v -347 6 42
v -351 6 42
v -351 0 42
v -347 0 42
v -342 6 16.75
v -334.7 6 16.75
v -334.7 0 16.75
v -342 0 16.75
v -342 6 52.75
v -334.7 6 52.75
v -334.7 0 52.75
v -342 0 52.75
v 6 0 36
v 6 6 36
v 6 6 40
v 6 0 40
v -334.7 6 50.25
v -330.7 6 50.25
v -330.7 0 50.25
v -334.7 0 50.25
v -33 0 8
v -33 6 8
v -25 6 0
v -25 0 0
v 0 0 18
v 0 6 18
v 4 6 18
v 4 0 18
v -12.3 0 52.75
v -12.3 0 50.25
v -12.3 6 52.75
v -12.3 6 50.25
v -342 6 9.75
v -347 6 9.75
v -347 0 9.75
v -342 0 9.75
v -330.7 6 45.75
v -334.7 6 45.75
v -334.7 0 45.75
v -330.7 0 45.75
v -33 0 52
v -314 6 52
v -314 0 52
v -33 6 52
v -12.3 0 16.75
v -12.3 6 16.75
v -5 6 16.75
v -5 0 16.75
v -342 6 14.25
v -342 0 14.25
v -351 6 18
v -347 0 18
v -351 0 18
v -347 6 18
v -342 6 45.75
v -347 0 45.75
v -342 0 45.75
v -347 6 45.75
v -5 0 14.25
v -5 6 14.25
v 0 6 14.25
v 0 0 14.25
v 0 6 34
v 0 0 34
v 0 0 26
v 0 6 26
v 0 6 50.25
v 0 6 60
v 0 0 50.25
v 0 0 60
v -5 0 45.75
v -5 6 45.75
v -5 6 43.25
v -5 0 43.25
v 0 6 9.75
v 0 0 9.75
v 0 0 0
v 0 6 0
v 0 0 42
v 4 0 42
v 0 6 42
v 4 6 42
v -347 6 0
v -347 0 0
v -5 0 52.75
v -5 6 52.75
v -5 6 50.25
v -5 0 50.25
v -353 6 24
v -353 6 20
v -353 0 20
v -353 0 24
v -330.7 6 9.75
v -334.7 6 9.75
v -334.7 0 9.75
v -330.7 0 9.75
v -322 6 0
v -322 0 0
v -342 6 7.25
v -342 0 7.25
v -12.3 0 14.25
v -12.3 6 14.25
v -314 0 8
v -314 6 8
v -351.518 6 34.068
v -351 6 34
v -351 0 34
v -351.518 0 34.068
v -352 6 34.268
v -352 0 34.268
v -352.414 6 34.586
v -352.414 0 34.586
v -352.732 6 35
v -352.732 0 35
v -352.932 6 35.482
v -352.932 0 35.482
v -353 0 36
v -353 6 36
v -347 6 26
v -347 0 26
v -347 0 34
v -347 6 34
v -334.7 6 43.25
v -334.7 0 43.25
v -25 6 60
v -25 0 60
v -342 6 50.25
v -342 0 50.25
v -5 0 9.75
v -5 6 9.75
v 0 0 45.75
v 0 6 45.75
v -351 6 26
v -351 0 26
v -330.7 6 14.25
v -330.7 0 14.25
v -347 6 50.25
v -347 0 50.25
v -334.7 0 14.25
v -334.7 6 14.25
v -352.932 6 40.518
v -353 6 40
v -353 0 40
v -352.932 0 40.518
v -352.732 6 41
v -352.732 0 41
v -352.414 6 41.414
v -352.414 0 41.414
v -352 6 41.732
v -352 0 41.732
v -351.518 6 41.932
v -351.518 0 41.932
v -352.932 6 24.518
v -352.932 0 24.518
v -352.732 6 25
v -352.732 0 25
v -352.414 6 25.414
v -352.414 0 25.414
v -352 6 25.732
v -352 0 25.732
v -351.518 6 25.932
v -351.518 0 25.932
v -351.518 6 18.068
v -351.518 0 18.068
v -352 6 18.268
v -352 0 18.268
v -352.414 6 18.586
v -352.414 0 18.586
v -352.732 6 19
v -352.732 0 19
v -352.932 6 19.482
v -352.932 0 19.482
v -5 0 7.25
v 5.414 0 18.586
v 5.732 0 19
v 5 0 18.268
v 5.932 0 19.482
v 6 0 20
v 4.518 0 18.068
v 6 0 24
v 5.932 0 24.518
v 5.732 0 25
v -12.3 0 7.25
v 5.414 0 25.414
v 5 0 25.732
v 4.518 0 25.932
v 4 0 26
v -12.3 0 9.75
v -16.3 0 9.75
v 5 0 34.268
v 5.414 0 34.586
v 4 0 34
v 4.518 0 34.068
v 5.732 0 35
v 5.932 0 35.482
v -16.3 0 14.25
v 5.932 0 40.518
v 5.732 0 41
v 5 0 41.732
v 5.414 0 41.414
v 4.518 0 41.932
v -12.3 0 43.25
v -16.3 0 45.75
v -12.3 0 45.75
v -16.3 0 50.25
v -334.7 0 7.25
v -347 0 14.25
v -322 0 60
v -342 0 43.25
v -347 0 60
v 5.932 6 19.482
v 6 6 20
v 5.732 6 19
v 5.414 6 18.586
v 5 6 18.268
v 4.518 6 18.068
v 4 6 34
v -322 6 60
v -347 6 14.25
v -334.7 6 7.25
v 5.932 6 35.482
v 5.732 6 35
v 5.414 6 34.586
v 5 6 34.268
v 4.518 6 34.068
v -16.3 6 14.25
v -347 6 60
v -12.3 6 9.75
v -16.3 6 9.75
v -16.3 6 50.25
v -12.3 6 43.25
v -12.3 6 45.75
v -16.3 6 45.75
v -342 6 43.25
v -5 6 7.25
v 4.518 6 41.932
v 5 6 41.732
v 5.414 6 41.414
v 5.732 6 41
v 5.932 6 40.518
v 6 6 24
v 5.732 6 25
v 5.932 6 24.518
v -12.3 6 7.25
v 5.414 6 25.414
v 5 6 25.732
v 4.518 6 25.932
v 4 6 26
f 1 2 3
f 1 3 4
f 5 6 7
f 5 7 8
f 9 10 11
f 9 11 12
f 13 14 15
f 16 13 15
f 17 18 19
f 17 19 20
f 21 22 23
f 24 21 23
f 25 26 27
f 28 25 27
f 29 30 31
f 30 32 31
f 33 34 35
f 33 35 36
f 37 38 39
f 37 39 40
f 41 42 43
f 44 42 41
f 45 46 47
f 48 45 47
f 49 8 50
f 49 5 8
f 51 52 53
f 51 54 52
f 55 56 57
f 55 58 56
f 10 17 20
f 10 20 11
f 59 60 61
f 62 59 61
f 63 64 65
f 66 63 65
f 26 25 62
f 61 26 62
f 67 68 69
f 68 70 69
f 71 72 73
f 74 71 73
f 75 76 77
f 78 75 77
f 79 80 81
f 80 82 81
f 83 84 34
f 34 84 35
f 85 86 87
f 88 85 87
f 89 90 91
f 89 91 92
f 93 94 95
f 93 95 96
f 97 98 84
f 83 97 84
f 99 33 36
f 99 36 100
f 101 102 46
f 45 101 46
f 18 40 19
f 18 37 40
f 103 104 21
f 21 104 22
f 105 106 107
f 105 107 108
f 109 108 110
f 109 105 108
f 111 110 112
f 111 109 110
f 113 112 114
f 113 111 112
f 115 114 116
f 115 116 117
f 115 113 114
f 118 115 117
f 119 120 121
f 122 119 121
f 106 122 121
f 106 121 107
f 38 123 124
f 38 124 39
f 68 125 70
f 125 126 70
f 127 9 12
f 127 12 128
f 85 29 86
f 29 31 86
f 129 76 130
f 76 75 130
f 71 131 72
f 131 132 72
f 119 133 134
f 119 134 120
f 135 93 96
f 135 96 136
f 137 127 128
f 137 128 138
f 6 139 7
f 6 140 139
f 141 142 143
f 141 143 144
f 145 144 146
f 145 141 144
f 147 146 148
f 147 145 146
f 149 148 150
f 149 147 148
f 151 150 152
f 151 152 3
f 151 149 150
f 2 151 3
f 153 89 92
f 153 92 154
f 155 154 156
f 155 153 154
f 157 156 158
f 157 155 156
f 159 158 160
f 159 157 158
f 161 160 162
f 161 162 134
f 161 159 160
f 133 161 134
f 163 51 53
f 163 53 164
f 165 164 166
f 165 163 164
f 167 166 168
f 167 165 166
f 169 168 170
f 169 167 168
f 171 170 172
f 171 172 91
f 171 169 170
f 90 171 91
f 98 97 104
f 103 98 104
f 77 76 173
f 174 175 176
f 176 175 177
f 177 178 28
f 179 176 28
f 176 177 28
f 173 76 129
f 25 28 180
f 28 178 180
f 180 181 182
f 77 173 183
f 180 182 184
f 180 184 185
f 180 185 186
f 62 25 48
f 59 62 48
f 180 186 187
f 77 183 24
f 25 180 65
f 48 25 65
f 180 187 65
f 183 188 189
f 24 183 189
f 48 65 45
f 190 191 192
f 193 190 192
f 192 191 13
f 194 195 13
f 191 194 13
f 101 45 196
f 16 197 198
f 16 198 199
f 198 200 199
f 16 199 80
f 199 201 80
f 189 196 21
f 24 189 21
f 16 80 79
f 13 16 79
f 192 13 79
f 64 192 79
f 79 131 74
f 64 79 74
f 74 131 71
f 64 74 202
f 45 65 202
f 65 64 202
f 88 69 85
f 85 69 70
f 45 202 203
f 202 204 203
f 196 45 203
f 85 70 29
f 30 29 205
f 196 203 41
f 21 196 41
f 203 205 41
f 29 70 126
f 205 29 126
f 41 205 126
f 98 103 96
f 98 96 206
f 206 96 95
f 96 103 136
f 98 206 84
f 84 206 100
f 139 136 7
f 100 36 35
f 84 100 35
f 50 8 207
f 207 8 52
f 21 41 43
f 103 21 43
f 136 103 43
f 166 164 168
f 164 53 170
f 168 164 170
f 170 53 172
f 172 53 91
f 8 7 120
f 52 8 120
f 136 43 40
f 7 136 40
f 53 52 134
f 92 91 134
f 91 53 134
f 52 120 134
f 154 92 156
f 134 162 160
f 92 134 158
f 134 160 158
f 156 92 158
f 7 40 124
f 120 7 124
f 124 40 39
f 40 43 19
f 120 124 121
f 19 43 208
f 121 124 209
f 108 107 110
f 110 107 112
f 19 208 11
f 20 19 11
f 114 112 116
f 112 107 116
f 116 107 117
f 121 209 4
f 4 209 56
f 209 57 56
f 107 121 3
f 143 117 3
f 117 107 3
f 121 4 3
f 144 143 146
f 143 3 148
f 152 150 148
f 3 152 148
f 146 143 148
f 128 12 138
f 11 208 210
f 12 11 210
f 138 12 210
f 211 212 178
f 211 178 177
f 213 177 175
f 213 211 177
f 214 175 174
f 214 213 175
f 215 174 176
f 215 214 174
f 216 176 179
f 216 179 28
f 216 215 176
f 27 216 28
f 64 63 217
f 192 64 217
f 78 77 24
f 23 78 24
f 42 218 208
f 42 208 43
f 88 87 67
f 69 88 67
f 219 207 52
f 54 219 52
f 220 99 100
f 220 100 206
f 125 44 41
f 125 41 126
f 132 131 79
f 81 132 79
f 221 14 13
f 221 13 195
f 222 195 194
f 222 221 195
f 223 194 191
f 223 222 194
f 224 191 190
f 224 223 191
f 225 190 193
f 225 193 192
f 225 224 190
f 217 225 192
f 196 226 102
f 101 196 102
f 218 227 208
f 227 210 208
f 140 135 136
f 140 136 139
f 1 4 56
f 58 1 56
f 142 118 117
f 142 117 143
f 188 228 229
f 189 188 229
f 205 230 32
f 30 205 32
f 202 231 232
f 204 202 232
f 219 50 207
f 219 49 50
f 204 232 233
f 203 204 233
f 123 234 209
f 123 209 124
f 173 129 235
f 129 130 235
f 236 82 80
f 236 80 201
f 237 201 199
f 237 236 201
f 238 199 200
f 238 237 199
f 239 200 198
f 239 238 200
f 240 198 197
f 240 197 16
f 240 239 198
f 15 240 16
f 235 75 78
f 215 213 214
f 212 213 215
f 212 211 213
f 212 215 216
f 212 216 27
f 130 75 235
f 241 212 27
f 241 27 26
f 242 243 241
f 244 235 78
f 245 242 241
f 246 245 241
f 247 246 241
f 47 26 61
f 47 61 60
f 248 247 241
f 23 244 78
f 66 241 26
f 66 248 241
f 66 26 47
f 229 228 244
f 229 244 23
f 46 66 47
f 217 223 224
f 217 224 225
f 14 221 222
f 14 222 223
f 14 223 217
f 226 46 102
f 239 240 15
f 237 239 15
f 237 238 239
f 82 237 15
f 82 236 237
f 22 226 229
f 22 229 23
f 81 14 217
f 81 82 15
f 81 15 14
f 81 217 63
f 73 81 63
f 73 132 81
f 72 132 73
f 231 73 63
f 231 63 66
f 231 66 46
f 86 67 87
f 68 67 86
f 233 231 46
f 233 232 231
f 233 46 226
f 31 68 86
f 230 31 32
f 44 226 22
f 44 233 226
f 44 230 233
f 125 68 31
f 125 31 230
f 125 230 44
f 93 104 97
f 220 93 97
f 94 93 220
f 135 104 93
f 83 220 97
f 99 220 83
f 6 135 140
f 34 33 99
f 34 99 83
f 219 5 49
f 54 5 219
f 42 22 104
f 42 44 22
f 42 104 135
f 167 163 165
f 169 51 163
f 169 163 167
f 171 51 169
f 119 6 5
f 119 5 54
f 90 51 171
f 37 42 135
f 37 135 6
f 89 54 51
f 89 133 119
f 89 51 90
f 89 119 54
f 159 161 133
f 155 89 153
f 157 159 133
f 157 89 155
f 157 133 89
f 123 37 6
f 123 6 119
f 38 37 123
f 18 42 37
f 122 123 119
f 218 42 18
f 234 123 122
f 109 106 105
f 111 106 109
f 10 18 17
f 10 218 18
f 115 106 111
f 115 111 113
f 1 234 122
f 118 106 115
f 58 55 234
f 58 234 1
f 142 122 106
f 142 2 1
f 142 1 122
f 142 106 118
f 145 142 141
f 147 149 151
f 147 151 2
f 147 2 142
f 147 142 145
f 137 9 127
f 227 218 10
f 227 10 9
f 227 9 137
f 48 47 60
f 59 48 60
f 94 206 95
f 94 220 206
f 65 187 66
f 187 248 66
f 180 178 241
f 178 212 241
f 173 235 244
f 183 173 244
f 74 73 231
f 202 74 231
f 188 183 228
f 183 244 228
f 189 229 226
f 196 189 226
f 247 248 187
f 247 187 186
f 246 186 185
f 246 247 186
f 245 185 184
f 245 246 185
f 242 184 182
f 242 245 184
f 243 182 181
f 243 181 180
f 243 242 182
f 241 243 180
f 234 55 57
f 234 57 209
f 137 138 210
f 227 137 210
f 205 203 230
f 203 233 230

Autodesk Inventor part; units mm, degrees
ref_plane "YZ Plane" through (0, 0, 0) normal (1, 0, 0) x (0, 1, 0)
ref_plane "XZ Plane" through (0, 0, 0) normal (0, 1, 0) x (-1, 0, 0)
ref_plane "XY Plane" through (0, 0, 0) normal (0, 0, 1) x (1, 0, 0)
sketch "Sketch1" plane through (0, 0, 0) normal (0, 1, 0) x (-1, 0, 0)
  line L0 (0, 0) -> (347, 0)
  line L1 (347, 0) -> (347, 60)
  line L2 (347, 60) -> (0, 60)
  line L3 (0, 60) -> (0, 0)
  dimension "d0" = 60
  dimension "d1" = 347
extrude "Extrusion1" add sketch "Sketch1" along normal blind 6
sketch "Sketch2" plane through (0, 6, 0) normal (0, 1, 0) x (1, 0, 0)
  line L0 (-347, 0) -> (-347, -60) projected
  line L1 (0, -60) -> (0, 0) projected
  line L2 (-347, -18) -> (-351, -18)
  line L3 (-353, -20) -> (-353, -24)
  line L4 (-351, -26) -> (-347, -26)
  line L5 (-347, -26) -> (-347, -18)
  line L6 (0, -18) -> (4, -18)
  line L7 (6, -20) -> (6, -24)
  line L8 (4, -26) -> (0, -26)
  line L9 (0, -26) -> (0, -18)
  arc A0 (-351, -18) -> (-353, -20) centre (-351, -20) ccw
  arc A1 (-353, -24) -> (-351, -26) centre (-351, -24) ccw
  arc A2 (6, -20) -> (4, -18) centre (4, -20) ccw
  arc A3 (4, -26) -> (6, -24) centre (4, -24) ccw
  line L10 (-347, -34) -> (-351, -34)
  line L11 (-353, -36) -> (-353, -40)
  line L12 (-351, -42) -> (-347, -42)
  line L13 (-347, -42) -> (-347, -34)
  line L14 (0, -34) -> (4, -34)
  line L15 (6, -36) -> (6, -40)
  line L16 (4, -42) -> (0, -42)
  line L17 (0, -42) -> (0, -34)
  arc A4 (-351, -34) -> (-353, -36) centre (-351, -36) ccw
  arc A5 (-353, -40) -> (-351, -42) centre (-351, -40) ccw
  arc A6 (6, -36) -> (4, -34) centre (4, -36) ccw
  arc A7 (4, -42) -> (6, -40) centre (4, -40) ccw
  line L18 (-349, -26) -> (-349, -34) construction
  point P0 (-349, -30)
  point P1 (-347, -30)
  dimension "d4" = 2
  dimension "d5" = 8
  dimension "d6" = 6
  dimension "d7" = 6
  dimension "d9" = 2
  dimension "d10" = 8
  dimension "d11" = 8
extrude "Extrusion2" add sketch "Sketch2" against normal blind 6
sketch "Sketch3" plane through (0, 6, 0) normal (0, 1, 0) x (1, 0, 0)
  line L0 (0, 0) -> (-347, 0) projected
  line L1 (-347, 0) -> (-347, -18) projected
  line L2 (-347, -60) -> (0, -60) projected
  line L3 (-330.7, -9.75) -> (-330.7, -14.25)
  line L4 (-347, -14.25) -> (-347, -9.75)
  line L5 (-342, -7.25) -> (-334.7, -7.25)
  line L6 (-334.7, -16.75) -> (-342, -16.75)
  line L7 (-347, -9.75) -> (-342, -9.75)
  line L8 (-334.7, -9.75) -> (-330.7, -9.75)
  line L9 (-330.7, -14.25) -> (-334.7, -14.25)
  line L10 (-342, -14.25) -> (-347, -14.25)
  line L11 (-342, -16.75) -> (-342, -14.25)
  line L12 (-342, -9.75) -> (-342, -7.25)
  line L13 (-334.7, -7.25) -> (-334.7, -9.75)
  line L14 (-334.7, -14.25) -> (-334.7, -16.75)
  line L15 (-330.7, -45.75) -> (-330.7, -50.25)
  line L16 (-347, -50.25) -> (-347, -45.75)
  line L17 (-342, -43.25) -> (-334.7, -43.25)
  line L18 (-334.7, -52.75) -> (-342, -52.75)
  line L19 (-347, -45.75) -> (-342, -45.75)
  line L20 (-334.7, -45.75) -> (-330.7, -45.75)
  line L21 (-330.7, -50.25) -> (-334.7, -50.25)
  line L22 (-342, -50.25) -> (-347, -50.25)
  line L23 (-342, -52.75) -> (-342, -50.25)
  line L24 (-342, -45.75) -> (-342, -43.25)
  line L25 (-334.7, -43.25) -> (-334.7, -45.75)
  line L26 (-334.7, -50.25) -> (-334.7, -52.75)
  line L27 (-173.5, -60) -> (-173.5, 0) construction
  line L28 (-16.3, -9.75) -> (-16.3, -14.25)
  line L29 (0, -14.25) -> (0, -9.75)
  line L30 (-5, -7.25) -> (-12.3, -7.25)
  line L31 (-12.3, -16.75) -> (-5, -16.75)
  line L32 (0, -9.75) -> (-5, -9.75)
  line L33 (-12.3, -9.75) -> (-16.3, -9.75)
  line L34 (-16.3, -14.25) -> (-12.3, -14.25)
  line L35 (-5, -14.25) -> (0, -14.25)
  line L36 (-5, -16.75) -> (-5, -14.25)
  line L37 (-5, -9.75) -> (-5, -7.25)
  line L38 (-12.3, -7.25) -> (-12.3, -9.75)
  line L39 (-12.3, -14.25) -> (-12.3, -16.75)
  line L40 (-16.3, -50.25) -> (-12.3, -50.25)
  line L41 (-16.3, -45.75) -> (-16.3, -50.25)
  line L42 (-12.3, -45.75) -> (-16.3, -45.75)
  line L43 (-12.3, -43.25) -> (-12.3, -45.75)
  line L44 (-12.3, -50.25) -> (-12.3, -52.75)
  line L45 (-5, -43.25) -> (-12.3, -43.25)
  line L46 (-12.3, -52.75) -> (-5, -52.75)
  line L47 (-5, -52.75) -> (-5, -50.25)
  line L48 (-5, -45.75) -> (-5, -43.25)
  line L49 (0, -45.75) -> (-5, -45.75)
  line L50 (-5, -50.25) -> (0, -50.25)
  line L51 (0, -50.25) -> (0, -45.75)
  point P0 (-347, -42)
  point P1 (-330.7, -12)
  point P2 (-330.7, -48)
  point P3 (-16.3, -12)
  point P4 (-16.3, -48)
  dimension "d14" = 4.5
  dimension "d15" = 2.5
  dimension "d16" = 2.5
  dimension "d17" = 5
  dimension "d18" = 4
  dimension "d19" = 7.3
  dimension "d20" = 4.5
  dimension "d21" = 2.5
  dimension "d22" = 2.5
  dimension "d23" = 5
  dimension "d24" = 4
  dimension "d25" = 7.3
  dimension "d26" = 6
  dimension "d27" = 6
extrude "Extrusion3" cut sketch "Sketch3" against normal blind 6
sketch "Sketch4" plane through (0, 6, 0) normal (0, 1, 0) x (1, 0, 0)
  line L0 (0, 0) -> (-347, 0) projected
  line L1 (-347, -60) -> (0, -60) projected
  line L2 (-5, -7.25) -> (-5, -9.75) projected
  line L3 (-322, 0) -> (-314, -8)
  line L4 (-314, -8) -> (-33, -8)
  line L5 (-33, -8) -> (-25, 0)
  line L6 (-322, -60) -> (-314, -52)
  line L7 (-314, -52) -> (-33, -52)
  line L8 (-33, -52) -> (-25, -60)
  dimension "d30" = 45
  dimension "d31" = 25
  dimension "d32" = 25
  dimension "d33" = 8
  dimension "d34" = 8
extrude "Extrusion4" cut sketch "Sketch4" against normal blind 6
equation "\"d16\" = d15"
equation "\"d22\" = d21"
equation "\"d27\" = d26"
equation "\"d34\" = d33"
properties part number "webcam_back_holder"
